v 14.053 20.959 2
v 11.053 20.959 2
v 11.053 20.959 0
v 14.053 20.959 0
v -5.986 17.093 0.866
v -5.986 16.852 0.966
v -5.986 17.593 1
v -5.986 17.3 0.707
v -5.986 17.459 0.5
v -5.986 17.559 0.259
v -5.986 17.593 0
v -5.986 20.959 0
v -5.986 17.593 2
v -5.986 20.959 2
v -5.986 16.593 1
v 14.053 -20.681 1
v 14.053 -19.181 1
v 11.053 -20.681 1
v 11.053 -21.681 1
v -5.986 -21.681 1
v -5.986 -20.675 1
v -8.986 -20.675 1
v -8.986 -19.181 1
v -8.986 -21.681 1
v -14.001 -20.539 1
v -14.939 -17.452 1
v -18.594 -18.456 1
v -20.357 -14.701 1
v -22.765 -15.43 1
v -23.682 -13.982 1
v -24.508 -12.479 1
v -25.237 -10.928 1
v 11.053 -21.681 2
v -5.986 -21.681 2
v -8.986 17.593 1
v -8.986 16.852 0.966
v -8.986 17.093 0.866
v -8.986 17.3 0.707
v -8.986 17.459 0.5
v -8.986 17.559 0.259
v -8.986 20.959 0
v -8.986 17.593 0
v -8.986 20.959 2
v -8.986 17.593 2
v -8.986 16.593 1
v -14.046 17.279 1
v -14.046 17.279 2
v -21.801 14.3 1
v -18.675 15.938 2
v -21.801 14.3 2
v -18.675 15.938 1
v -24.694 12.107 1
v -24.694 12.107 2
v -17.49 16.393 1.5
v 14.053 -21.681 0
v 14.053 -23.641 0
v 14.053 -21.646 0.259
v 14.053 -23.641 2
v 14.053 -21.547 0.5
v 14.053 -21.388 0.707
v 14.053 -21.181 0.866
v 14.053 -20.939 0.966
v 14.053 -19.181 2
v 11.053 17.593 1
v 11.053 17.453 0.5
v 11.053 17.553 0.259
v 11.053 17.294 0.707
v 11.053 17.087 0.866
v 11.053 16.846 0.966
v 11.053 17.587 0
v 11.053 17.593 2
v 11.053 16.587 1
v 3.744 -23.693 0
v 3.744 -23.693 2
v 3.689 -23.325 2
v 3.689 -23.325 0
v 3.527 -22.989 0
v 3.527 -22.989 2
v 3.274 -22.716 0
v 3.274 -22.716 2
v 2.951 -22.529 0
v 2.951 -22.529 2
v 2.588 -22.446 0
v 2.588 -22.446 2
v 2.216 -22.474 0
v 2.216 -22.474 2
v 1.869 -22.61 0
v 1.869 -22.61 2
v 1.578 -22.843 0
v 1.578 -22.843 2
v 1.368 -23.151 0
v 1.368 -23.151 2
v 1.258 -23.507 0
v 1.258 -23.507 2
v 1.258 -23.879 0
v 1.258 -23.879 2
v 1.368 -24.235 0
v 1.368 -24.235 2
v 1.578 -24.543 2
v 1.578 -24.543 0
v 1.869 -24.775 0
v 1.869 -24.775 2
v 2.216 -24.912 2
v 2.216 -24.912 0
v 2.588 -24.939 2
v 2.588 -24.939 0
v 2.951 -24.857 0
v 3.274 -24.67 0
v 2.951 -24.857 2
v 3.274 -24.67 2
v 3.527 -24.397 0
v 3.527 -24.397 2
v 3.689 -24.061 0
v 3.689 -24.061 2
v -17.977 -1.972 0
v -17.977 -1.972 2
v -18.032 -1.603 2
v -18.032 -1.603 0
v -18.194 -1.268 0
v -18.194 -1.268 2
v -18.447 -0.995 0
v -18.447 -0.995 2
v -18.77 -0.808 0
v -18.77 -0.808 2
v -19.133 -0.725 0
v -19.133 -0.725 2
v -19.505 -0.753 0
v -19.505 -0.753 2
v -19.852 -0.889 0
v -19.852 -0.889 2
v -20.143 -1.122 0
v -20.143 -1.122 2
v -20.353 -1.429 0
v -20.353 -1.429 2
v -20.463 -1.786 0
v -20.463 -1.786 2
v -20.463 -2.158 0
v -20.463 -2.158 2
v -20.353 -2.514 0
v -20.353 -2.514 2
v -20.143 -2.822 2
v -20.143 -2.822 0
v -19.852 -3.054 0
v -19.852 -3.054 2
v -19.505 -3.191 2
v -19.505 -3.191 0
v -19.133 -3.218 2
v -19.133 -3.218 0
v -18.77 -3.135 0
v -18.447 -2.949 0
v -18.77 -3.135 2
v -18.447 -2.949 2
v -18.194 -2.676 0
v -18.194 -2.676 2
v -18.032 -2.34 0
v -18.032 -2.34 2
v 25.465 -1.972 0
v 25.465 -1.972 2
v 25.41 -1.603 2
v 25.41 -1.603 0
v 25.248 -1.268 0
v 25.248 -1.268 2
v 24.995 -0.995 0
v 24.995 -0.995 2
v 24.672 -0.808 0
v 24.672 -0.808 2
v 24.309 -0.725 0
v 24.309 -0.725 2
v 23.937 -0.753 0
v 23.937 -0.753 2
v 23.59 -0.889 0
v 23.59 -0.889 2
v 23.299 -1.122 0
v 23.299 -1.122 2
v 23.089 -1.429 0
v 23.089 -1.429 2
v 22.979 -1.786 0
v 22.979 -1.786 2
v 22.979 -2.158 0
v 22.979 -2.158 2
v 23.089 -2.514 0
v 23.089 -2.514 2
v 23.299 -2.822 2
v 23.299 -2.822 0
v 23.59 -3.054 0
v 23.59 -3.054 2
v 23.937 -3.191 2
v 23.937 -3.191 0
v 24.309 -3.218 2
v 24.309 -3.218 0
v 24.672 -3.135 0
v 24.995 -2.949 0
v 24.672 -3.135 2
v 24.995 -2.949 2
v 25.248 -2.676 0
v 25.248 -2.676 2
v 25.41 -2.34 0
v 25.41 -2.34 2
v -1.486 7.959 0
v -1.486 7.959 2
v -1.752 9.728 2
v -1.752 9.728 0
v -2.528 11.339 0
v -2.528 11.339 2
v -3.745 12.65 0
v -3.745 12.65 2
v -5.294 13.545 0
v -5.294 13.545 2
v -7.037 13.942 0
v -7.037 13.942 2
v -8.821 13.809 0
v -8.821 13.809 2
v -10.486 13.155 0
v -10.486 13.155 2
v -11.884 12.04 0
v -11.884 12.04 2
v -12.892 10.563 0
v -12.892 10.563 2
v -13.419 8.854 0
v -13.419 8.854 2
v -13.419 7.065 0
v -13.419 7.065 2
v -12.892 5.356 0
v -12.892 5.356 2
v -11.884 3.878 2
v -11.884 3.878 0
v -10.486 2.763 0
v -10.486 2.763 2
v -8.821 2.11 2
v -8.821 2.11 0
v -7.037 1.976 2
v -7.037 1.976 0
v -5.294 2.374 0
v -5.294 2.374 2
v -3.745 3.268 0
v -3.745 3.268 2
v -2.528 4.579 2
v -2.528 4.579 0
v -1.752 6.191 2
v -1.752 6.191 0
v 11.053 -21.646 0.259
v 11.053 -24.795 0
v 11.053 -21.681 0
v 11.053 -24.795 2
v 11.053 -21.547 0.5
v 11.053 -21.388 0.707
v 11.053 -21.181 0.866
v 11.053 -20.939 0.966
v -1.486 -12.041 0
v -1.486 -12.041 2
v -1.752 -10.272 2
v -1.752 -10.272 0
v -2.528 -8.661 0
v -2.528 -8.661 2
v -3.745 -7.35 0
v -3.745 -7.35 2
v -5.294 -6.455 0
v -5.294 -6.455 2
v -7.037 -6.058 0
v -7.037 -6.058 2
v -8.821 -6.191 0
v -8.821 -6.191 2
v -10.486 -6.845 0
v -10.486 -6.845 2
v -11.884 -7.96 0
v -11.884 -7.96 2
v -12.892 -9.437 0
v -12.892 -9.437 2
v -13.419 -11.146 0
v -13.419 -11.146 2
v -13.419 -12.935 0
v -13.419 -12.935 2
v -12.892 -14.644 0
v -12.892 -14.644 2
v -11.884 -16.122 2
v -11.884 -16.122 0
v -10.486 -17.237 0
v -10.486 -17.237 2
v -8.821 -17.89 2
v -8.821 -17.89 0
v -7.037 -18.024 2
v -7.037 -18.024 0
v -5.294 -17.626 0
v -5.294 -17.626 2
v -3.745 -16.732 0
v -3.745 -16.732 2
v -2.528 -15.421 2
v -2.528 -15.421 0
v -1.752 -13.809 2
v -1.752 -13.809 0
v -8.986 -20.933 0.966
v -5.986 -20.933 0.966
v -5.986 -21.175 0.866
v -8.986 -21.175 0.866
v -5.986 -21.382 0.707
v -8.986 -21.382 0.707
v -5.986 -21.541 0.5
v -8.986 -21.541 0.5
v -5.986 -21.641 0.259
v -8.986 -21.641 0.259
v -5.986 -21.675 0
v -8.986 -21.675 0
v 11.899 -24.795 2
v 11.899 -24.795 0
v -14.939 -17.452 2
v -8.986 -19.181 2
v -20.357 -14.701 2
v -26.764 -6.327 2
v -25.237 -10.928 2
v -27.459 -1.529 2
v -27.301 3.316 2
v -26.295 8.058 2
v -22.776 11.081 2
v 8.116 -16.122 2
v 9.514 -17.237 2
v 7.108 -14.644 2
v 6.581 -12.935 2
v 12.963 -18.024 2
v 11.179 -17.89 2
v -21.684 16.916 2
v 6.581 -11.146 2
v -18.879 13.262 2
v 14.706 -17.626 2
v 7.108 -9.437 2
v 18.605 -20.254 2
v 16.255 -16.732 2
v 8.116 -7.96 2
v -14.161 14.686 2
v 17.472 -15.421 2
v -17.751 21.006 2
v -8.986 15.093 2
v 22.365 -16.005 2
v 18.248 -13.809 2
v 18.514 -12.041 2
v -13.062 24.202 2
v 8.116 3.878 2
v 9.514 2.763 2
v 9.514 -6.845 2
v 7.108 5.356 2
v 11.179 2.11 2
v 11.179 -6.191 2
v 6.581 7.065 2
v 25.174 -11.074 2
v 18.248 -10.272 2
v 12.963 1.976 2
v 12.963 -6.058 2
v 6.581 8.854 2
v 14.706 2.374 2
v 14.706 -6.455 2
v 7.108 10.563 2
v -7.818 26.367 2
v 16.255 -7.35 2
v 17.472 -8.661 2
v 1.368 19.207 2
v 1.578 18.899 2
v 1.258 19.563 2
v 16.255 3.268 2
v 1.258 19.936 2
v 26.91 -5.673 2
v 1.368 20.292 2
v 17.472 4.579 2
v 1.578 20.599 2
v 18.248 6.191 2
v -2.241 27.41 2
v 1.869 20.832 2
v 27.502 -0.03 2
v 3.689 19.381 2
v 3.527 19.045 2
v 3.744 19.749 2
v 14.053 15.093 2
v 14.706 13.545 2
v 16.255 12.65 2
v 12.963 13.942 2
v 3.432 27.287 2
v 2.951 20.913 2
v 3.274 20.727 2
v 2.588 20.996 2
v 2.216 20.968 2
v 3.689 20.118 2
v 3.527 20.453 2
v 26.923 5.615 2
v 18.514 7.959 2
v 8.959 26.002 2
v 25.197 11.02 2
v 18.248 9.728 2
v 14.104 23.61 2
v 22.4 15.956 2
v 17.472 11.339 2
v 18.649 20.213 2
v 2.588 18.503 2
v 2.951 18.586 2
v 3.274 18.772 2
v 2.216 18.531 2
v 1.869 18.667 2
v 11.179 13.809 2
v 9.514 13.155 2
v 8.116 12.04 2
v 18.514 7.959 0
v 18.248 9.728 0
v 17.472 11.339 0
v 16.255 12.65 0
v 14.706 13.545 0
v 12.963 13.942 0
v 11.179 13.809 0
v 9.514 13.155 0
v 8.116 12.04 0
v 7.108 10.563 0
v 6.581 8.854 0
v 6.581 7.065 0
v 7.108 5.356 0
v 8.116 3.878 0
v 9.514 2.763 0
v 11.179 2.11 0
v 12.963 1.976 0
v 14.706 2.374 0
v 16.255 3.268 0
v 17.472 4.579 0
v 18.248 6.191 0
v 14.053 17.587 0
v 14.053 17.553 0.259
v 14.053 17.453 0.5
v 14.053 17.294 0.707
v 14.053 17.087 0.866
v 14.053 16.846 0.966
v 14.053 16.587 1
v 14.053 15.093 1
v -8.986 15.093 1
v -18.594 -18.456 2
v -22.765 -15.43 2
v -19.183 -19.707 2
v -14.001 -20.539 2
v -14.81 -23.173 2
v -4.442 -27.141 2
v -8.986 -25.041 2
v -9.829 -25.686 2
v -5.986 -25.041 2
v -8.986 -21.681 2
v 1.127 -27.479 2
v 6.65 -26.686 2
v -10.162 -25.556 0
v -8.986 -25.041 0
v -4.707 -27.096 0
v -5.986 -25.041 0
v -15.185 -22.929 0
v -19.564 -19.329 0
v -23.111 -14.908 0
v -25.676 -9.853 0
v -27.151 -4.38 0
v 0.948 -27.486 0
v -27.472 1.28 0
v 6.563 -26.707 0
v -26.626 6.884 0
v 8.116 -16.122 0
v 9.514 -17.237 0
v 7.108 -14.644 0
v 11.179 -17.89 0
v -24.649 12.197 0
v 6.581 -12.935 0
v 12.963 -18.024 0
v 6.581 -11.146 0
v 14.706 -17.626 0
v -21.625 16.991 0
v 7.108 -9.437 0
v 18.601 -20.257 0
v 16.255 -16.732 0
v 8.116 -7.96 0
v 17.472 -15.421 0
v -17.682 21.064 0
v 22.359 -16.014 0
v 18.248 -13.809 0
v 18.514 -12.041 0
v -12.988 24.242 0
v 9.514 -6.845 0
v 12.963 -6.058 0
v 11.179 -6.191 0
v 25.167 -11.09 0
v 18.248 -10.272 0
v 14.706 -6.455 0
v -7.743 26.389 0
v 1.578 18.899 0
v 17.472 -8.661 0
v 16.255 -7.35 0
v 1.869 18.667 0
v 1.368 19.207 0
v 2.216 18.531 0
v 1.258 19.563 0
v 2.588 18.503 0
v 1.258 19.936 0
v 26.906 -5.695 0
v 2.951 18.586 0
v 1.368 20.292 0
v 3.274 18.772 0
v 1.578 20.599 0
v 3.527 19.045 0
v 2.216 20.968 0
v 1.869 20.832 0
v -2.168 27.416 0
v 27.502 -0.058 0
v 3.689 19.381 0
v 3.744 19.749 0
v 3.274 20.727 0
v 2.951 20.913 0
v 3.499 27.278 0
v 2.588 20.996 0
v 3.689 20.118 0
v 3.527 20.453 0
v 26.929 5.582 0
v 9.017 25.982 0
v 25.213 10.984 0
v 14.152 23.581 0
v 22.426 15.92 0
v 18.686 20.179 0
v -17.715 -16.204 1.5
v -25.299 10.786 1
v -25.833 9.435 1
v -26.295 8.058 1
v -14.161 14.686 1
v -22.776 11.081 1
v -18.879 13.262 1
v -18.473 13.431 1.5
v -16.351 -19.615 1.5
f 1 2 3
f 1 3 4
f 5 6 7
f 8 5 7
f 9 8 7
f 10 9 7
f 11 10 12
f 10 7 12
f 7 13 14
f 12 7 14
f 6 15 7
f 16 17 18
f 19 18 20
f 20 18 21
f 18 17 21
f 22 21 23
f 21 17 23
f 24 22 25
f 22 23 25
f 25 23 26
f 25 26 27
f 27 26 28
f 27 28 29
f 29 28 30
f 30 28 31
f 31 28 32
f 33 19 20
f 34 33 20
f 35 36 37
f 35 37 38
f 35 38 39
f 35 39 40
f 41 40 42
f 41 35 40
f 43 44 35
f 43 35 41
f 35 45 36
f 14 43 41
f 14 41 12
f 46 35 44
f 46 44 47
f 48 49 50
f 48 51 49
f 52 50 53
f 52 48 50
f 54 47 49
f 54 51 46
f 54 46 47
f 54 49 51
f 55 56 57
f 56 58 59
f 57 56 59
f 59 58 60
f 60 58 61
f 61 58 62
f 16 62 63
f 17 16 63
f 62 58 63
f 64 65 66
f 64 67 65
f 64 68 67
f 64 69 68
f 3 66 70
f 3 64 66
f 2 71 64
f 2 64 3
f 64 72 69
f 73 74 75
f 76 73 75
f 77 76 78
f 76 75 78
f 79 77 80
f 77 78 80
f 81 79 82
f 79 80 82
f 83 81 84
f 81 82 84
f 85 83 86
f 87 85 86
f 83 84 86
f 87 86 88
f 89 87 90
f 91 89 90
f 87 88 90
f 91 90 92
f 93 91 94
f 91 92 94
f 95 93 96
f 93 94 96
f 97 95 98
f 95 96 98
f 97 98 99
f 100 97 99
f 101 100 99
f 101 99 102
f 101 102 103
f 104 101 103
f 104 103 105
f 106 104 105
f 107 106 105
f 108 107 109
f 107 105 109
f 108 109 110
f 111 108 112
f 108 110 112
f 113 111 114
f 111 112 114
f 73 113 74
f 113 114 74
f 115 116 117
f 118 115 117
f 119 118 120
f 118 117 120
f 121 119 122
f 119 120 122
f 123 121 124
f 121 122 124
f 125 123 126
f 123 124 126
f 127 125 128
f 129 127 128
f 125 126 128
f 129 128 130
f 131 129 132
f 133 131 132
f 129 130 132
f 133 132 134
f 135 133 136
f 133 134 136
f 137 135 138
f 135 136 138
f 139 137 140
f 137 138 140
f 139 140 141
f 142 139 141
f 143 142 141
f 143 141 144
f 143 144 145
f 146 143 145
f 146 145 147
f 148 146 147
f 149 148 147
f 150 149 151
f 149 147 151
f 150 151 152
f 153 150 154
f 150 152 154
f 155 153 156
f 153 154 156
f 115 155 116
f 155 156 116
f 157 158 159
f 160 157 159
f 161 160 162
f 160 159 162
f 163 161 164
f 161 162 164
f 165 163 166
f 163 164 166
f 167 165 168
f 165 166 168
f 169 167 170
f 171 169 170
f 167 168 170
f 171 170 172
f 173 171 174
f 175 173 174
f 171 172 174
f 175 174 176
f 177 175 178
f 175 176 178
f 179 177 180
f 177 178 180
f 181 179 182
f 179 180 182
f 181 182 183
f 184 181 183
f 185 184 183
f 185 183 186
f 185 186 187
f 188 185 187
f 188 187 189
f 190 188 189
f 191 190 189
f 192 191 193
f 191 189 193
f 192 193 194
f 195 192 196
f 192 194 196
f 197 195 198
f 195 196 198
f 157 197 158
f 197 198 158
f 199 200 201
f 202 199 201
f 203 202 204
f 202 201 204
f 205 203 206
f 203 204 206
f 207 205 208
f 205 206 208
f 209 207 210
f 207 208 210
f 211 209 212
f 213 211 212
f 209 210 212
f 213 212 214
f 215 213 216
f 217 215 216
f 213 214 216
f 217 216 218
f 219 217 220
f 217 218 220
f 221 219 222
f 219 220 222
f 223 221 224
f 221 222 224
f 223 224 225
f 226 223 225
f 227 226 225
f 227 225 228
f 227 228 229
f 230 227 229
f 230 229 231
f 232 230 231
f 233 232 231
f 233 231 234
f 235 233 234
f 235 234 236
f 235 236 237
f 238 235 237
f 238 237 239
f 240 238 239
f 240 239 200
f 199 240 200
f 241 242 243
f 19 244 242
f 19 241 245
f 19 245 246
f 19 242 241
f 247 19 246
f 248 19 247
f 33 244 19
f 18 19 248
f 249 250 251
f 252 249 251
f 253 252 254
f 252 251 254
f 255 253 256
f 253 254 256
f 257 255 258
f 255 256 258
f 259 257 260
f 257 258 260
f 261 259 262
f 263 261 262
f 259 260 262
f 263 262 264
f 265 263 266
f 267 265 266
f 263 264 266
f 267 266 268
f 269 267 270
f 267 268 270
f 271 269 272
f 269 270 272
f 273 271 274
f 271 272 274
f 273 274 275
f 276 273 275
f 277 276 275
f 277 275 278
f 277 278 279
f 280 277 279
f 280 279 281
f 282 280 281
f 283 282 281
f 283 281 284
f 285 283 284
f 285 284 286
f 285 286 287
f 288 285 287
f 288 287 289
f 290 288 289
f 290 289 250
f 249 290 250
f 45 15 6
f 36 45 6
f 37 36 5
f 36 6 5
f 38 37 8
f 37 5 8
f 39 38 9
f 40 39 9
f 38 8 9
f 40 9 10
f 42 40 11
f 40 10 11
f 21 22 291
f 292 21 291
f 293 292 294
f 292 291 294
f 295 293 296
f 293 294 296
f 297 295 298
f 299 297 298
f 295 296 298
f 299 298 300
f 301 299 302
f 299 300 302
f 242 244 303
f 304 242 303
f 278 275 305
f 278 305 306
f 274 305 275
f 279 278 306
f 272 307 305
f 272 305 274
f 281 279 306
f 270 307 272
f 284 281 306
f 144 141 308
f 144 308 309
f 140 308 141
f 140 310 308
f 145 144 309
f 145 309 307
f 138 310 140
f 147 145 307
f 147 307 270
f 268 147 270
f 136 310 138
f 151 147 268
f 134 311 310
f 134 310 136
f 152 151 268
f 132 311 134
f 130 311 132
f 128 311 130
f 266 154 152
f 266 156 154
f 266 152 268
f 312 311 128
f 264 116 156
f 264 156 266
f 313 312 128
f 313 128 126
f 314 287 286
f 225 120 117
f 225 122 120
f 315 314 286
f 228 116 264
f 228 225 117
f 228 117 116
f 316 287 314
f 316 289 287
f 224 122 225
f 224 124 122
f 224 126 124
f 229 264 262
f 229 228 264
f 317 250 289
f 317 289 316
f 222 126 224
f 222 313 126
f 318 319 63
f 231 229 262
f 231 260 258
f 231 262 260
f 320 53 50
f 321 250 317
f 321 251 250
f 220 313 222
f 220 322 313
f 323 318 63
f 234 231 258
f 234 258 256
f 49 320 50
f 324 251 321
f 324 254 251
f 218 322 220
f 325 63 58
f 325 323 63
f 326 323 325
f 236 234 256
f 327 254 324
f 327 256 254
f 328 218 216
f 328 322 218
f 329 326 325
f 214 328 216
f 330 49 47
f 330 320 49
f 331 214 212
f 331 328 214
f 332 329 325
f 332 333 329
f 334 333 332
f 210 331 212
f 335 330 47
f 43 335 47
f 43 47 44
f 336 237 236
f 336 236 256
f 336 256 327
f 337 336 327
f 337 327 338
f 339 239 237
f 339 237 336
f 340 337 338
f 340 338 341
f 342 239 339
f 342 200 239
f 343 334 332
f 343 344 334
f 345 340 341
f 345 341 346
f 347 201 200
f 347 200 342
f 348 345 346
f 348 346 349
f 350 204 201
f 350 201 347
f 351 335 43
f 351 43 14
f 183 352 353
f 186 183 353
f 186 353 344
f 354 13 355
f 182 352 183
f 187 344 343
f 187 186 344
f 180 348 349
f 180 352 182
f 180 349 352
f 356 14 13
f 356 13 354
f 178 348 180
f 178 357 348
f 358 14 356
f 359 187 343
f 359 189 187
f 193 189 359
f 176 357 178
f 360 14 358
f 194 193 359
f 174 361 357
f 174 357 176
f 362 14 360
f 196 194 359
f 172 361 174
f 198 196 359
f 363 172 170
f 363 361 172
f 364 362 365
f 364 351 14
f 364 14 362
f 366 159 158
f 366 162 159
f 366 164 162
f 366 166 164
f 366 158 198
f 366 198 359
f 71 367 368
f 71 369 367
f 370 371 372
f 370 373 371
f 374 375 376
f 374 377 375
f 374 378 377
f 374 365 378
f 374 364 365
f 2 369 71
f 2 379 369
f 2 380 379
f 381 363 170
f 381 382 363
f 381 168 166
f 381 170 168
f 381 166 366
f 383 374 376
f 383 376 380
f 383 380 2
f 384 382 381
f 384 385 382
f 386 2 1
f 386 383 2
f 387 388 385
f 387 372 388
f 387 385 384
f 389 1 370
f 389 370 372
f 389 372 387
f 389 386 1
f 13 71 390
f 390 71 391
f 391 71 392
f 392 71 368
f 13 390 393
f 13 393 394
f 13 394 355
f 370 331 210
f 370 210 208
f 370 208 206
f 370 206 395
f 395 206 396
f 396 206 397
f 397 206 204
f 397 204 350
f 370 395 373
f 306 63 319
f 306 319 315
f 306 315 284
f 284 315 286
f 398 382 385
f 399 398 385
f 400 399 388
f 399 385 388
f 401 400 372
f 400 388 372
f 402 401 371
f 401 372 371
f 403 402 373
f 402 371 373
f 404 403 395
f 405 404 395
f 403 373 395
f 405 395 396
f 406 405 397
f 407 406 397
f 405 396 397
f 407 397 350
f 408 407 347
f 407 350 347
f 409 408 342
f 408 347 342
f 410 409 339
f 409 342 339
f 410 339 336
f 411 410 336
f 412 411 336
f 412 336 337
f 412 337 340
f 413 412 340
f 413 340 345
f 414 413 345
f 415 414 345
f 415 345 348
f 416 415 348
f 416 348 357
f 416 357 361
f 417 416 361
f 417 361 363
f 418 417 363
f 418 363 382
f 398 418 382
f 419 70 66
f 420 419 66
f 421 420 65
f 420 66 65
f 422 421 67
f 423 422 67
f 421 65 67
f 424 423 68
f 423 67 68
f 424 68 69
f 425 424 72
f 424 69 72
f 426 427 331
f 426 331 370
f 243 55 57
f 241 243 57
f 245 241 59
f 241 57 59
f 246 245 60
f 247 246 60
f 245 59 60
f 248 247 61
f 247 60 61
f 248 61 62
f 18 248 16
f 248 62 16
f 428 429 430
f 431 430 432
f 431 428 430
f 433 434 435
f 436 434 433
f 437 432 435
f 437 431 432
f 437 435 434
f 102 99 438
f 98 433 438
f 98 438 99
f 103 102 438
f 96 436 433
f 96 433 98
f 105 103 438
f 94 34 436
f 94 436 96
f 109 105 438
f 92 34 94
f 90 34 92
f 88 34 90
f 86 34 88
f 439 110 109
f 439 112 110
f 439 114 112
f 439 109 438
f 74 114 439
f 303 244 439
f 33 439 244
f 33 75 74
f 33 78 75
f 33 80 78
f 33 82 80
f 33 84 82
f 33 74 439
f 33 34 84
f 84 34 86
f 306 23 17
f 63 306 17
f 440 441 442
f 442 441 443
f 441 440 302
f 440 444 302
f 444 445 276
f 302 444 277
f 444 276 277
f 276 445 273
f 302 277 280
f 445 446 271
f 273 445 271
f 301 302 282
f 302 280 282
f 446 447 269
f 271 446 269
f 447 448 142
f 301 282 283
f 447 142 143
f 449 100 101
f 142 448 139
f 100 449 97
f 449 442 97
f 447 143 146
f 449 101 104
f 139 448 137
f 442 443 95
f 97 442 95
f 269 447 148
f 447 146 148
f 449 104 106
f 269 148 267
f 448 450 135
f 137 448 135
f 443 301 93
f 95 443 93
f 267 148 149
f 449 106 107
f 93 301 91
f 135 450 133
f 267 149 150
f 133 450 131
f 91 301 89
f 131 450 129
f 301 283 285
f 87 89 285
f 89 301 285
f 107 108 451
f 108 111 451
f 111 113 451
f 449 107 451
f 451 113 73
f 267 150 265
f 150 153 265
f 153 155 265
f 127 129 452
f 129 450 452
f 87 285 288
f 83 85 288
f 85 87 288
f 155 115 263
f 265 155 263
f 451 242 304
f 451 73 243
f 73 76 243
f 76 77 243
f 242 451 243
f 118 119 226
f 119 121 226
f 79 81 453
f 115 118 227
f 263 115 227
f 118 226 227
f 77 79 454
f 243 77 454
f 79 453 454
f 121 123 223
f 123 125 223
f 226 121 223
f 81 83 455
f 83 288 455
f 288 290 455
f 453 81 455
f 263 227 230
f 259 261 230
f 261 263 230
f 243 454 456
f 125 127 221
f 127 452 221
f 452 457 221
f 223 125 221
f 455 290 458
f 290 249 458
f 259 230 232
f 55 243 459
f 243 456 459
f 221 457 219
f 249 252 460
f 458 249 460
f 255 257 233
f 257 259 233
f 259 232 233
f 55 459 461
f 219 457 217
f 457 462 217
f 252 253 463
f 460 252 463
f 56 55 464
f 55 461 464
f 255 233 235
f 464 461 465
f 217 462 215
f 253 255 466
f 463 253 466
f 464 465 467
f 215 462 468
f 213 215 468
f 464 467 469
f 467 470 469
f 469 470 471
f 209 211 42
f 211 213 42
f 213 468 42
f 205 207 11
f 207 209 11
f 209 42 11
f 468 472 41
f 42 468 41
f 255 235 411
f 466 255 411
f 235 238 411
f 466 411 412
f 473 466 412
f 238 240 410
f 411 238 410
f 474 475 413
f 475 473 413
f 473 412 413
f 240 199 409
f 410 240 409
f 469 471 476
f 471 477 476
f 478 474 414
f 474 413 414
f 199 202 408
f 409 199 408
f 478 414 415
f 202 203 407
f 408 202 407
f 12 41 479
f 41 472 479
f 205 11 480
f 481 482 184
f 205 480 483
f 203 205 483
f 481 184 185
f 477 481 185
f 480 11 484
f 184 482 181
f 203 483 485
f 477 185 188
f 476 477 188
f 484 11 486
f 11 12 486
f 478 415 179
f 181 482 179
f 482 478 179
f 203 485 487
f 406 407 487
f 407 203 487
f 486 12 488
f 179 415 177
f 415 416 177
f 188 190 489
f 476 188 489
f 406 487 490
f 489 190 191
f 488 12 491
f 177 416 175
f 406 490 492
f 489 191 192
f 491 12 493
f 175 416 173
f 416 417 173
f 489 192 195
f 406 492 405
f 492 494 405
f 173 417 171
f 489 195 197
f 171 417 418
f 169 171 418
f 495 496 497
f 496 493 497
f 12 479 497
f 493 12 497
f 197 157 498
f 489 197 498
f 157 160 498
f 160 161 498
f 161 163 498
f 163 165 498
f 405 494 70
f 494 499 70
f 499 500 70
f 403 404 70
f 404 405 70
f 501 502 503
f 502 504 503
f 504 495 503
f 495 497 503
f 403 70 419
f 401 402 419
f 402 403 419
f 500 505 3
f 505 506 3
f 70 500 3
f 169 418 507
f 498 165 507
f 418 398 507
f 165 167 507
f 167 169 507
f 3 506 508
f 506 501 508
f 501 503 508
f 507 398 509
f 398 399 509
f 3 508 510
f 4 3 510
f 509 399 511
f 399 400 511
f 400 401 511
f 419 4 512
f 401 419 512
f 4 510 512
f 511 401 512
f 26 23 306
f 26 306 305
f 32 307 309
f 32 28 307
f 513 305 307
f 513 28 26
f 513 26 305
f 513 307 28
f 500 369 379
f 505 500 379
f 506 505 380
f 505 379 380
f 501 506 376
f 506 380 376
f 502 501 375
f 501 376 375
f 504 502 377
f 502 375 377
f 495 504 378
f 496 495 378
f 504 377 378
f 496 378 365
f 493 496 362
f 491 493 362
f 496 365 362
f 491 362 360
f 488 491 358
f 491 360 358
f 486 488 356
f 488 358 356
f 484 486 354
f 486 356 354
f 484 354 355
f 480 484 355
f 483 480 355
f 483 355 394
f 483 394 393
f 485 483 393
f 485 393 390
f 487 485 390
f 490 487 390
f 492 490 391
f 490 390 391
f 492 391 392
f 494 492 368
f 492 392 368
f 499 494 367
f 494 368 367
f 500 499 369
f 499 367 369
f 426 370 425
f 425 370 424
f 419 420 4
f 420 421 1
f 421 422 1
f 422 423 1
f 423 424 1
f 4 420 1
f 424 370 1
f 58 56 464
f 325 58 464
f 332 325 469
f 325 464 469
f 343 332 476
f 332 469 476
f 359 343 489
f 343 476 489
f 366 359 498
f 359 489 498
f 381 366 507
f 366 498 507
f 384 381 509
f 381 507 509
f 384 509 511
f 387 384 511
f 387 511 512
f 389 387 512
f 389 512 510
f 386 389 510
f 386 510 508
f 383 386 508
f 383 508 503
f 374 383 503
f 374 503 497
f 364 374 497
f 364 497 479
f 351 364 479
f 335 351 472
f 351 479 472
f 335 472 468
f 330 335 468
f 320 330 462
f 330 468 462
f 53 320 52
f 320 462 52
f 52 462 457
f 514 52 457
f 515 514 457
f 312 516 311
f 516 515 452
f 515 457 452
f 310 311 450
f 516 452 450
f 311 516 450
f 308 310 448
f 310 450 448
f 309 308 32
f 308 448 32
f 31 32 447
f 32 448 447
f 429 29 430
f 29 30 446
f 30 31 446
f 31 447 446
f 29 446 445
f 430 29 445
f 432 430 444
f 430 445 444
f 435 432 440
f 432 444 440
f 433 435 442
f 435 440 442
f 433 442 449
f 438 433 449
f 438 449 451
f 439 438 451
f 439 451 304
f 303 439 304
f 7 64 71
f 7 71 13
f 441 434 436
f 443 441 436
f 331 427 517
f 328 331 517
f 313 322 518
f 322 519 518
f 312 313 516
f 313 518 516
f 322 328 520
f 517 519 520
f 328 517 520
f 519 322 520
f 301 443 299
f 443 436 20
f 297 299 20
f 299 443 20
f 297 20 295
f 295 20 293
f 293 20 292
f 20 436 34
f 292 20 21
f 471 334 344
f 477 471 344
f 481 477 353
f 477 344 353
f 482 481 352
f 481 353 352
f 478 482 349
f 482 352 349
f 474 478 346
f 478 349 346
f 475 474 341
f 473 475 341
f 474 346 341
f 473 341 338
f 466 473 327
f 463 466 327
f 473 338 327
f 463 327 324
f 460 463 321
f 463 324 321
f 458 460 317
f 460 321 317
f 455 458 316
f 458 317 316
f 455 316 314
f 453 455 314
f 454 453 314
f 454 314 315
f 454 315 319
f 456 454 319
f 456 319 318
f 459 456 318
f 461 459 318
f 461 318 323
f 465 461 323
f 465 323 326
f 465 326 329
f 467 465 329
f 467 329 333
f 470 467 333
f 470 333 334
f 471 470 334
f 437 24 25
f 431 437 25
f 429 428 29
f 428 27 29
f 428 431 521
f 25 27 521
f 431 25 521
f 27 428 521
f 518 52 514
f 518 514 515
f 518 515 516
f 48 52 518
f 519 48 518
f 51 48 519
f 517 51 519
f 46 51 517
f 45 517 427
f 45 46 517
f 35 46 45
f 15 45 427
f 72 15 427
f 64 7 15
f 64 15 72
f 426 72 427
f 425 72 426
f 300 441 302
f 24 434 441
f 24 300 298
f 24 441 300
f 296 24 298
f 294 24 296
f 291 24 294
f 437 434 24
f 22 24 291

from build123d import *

# Parameters (mm, degrees)
SKETCH_2_R          = 27.501856853
EXTRUDE_1_DEPTH     = 2
SKETCH_3_R          = 1.25
CUT_EXTRUDE_1_DEPTH = 2
SKETCH_4_R          = 6
CUT_EXTRUDE_2_DEPTH = 10
SKETCH_5_W          = 3
SKETCH_5_H          = 3.366075566
SKETCH_5_H_2        = 3.372140362
SKETCH_5_H_3        = 3.114077882
CUT_EXTRUDE_3_DEPTH = 10
CUT_EXTRUDE_START   = -1
CUT_EXTRUDE_4_DEPTH = 1
FILLET_1_R          = 1


with BuildPart() as part:
    # 草图2 → 凸台-拉伸1 (new body)
    with BuildSketch(Plane.XY):
        Circle(SKETCH_2_R)
    extrude(amount=EXTRUDE_1_DEPTH)

    # 草图3 → 切除-拉伸1 (cut)
    with BuildSketch(Plane.XY.offset(2)):
        with Locations((2.49431801, 19.749253685)):
            Circle(SKETCH_3_R)
        with Locations((-19.226781008, -1.971845333)):
            Circle(SKETCH_3_R)
        with Locations((2.49431801, -23.692944351)):
            Circle(SKETCH_3_R)
        with Locations((24.215417028, -1.971845333)):
            Circle(SKETCH_3_R)
    extrude(amount=-CUT_EXTRUDE_1_DEPTH, mode=Mode.SUBTRACT)

    # 草图4 → 切除-拉伸2 (cut)
    with BuildSketch(Plane.XY.offset(2)):
        with Locations((-7.485828256, 7.959275259)):
            Circle(SKETCH_4_R)
        with Locations((12.514171744, 7.959275259)):
            Circle(SKETCH_4_R)
        with Locations((-7.485828256, -12.040724741)):
            Circle(SKETCH_4_R)
        with Locations((12.514171744, -12.040724741)):
            Circle(SKETCH_4_R)
    extrude(amount=-CUT_EXTRUDE_2_DEPTH, mode=Mode.SUBTRACT)

    # 草图5 → 切除-拉伸3 (cut)
    with BuildSketch(Plane.XY.offset(2)):
        with Locations((-7.485828256, 19.276237476)):
            Rectangle(SKETCH_5_W, SKETCH_5_H)
        with Locations((12.55261862, 19.273205078)):
            Rectangle(SKETCH_5_W, SKETCH_5_H_2)
        with Locations((-7.485828256, -23.357686958)):
            Rectangle(SKETCH_5_W, SKETCH_5_H)
        with Locations((12.55261862, -23.237595759)):
            Rectangle(SKETCH_5_W, SKETCH_5_H_3)
    extrude(amount=-CUT_EXTRUDE_3_DEPTH, mode=Mode.SUBTRACT)

    # 草图6 → 切除-拉伸4 (cut)
    with BuildSketch(Plane.XY.offset(2).offset(CUT_EXTRUDE_START)):
        with BuildLine():
            Line((14.05261862, -21.680556818), (-8.985828256, -21.680556818))
            add(Edge.make_bspline(
                [(-8.985828256, -21.680556818), (-16.825868564, -20.675103315), (-22.765275429, -15.430306704)],
                knots=[0, 0, 0, 1, 1, 1], degree=2))
            ThreePointArc((-22.765275429, -15.430306704), (-24.106708477, -13.237021446), (-25.237467212, -10.928054679))
            add(Edge.make_bspline(
                [(-8.985828256, -19.180556818), (-18.318618244, -17.354029051), (-25.237467212, -10.928054679)],
                knots=[0, 0, 0, 1, 1, 1], degree=2))
            Line((-8.985828256, -19.180556818), (14.05261862, -19.180556818))
            Line((14.05261862, -19.180556818), (14.05261862, -21.680556818))
        make_face()
        with BuildLine():
            Line((14.05261862, 17.593199693), (-8.985828256, 17.593199693))
            add(Edge.make_bspline(
                [(-8.985828256, 17.593199693), (-18.141159964, 17.936782553), (-24.69378833, 12.10656633)],
                knots=[0, 0, 0, 1, 1, 1], degree=2))
            ThreePointArc((-24.69378833, 12.10656633), (-25.574531677, 10.114121805), (-26.294813962, 8.058218729))
            add(Edge.make_bspline(
                [(-8.985828256, 15.093199693), (-19.306553581, 15.286867634), (-26.294813962, 8.058218729)],
                knots=[0, 0, 0, 1, 1, 1], degree=2))
            Line((-8.985828256, 15.093199693), (14.05261862, 15.093199693))
            Line((14.05261862, 15.093199693), (14.05261862, 17.593199693))
        make_face()
    extrude(amount=CUT_EXTRUDE_4_DEPTH, mode=Mode.SUBTRACT)

    # 圆角1
    # the kernel refuses this fillet: 1 mm, written as the material it takes off along each edge
    with BuildSketch(Plane(origin=(-8.985828256, -21.674649175, 1), x_dir=(0, 0, -1), z_dir=(1, 0, 0)), Plane(origin=(-5.985828256, 17.593199693, 1), x_dir=(0, 0, -1), z_dir=(-1, 0, 0))) as fillet_1_piece_1:
        with BuildLine():
            CenterArc((FILLET_1_R, FILLET_1_R), FILLET_1_R, 180, 90)
            Line((0, FILLET_1_R), (0, 0))
            Line((0, 0), (FILLET_1_R, 0))
        make_face()
    extrude(amount=3, mode=Mode.SUBTRACT)
    with BuildSketch(Plane(origin=(14.05261862, -21.680556818, 1), x_dir=(0, 0, -1), z_dir=(-1, 0, 0)), Plane(origin=(11.05261862, 17.587134897, 1), x_dir=(0, 0, -1), z_dir=(1, 0, 0))) as fillet_1_piece_2:
        with BuildLine():
            CenterArc((FILLET_1_R, -FILLET_1_R), FILLET_1_R, 90, 90)
            Line((0, -FILLET_1_R), (0, 0))
            Line((0, 0), (FILLET_1_R, 0))
        make_face()
    extrude(amount=3, mode=Mode.SUBTRACT)


solid = part.part
